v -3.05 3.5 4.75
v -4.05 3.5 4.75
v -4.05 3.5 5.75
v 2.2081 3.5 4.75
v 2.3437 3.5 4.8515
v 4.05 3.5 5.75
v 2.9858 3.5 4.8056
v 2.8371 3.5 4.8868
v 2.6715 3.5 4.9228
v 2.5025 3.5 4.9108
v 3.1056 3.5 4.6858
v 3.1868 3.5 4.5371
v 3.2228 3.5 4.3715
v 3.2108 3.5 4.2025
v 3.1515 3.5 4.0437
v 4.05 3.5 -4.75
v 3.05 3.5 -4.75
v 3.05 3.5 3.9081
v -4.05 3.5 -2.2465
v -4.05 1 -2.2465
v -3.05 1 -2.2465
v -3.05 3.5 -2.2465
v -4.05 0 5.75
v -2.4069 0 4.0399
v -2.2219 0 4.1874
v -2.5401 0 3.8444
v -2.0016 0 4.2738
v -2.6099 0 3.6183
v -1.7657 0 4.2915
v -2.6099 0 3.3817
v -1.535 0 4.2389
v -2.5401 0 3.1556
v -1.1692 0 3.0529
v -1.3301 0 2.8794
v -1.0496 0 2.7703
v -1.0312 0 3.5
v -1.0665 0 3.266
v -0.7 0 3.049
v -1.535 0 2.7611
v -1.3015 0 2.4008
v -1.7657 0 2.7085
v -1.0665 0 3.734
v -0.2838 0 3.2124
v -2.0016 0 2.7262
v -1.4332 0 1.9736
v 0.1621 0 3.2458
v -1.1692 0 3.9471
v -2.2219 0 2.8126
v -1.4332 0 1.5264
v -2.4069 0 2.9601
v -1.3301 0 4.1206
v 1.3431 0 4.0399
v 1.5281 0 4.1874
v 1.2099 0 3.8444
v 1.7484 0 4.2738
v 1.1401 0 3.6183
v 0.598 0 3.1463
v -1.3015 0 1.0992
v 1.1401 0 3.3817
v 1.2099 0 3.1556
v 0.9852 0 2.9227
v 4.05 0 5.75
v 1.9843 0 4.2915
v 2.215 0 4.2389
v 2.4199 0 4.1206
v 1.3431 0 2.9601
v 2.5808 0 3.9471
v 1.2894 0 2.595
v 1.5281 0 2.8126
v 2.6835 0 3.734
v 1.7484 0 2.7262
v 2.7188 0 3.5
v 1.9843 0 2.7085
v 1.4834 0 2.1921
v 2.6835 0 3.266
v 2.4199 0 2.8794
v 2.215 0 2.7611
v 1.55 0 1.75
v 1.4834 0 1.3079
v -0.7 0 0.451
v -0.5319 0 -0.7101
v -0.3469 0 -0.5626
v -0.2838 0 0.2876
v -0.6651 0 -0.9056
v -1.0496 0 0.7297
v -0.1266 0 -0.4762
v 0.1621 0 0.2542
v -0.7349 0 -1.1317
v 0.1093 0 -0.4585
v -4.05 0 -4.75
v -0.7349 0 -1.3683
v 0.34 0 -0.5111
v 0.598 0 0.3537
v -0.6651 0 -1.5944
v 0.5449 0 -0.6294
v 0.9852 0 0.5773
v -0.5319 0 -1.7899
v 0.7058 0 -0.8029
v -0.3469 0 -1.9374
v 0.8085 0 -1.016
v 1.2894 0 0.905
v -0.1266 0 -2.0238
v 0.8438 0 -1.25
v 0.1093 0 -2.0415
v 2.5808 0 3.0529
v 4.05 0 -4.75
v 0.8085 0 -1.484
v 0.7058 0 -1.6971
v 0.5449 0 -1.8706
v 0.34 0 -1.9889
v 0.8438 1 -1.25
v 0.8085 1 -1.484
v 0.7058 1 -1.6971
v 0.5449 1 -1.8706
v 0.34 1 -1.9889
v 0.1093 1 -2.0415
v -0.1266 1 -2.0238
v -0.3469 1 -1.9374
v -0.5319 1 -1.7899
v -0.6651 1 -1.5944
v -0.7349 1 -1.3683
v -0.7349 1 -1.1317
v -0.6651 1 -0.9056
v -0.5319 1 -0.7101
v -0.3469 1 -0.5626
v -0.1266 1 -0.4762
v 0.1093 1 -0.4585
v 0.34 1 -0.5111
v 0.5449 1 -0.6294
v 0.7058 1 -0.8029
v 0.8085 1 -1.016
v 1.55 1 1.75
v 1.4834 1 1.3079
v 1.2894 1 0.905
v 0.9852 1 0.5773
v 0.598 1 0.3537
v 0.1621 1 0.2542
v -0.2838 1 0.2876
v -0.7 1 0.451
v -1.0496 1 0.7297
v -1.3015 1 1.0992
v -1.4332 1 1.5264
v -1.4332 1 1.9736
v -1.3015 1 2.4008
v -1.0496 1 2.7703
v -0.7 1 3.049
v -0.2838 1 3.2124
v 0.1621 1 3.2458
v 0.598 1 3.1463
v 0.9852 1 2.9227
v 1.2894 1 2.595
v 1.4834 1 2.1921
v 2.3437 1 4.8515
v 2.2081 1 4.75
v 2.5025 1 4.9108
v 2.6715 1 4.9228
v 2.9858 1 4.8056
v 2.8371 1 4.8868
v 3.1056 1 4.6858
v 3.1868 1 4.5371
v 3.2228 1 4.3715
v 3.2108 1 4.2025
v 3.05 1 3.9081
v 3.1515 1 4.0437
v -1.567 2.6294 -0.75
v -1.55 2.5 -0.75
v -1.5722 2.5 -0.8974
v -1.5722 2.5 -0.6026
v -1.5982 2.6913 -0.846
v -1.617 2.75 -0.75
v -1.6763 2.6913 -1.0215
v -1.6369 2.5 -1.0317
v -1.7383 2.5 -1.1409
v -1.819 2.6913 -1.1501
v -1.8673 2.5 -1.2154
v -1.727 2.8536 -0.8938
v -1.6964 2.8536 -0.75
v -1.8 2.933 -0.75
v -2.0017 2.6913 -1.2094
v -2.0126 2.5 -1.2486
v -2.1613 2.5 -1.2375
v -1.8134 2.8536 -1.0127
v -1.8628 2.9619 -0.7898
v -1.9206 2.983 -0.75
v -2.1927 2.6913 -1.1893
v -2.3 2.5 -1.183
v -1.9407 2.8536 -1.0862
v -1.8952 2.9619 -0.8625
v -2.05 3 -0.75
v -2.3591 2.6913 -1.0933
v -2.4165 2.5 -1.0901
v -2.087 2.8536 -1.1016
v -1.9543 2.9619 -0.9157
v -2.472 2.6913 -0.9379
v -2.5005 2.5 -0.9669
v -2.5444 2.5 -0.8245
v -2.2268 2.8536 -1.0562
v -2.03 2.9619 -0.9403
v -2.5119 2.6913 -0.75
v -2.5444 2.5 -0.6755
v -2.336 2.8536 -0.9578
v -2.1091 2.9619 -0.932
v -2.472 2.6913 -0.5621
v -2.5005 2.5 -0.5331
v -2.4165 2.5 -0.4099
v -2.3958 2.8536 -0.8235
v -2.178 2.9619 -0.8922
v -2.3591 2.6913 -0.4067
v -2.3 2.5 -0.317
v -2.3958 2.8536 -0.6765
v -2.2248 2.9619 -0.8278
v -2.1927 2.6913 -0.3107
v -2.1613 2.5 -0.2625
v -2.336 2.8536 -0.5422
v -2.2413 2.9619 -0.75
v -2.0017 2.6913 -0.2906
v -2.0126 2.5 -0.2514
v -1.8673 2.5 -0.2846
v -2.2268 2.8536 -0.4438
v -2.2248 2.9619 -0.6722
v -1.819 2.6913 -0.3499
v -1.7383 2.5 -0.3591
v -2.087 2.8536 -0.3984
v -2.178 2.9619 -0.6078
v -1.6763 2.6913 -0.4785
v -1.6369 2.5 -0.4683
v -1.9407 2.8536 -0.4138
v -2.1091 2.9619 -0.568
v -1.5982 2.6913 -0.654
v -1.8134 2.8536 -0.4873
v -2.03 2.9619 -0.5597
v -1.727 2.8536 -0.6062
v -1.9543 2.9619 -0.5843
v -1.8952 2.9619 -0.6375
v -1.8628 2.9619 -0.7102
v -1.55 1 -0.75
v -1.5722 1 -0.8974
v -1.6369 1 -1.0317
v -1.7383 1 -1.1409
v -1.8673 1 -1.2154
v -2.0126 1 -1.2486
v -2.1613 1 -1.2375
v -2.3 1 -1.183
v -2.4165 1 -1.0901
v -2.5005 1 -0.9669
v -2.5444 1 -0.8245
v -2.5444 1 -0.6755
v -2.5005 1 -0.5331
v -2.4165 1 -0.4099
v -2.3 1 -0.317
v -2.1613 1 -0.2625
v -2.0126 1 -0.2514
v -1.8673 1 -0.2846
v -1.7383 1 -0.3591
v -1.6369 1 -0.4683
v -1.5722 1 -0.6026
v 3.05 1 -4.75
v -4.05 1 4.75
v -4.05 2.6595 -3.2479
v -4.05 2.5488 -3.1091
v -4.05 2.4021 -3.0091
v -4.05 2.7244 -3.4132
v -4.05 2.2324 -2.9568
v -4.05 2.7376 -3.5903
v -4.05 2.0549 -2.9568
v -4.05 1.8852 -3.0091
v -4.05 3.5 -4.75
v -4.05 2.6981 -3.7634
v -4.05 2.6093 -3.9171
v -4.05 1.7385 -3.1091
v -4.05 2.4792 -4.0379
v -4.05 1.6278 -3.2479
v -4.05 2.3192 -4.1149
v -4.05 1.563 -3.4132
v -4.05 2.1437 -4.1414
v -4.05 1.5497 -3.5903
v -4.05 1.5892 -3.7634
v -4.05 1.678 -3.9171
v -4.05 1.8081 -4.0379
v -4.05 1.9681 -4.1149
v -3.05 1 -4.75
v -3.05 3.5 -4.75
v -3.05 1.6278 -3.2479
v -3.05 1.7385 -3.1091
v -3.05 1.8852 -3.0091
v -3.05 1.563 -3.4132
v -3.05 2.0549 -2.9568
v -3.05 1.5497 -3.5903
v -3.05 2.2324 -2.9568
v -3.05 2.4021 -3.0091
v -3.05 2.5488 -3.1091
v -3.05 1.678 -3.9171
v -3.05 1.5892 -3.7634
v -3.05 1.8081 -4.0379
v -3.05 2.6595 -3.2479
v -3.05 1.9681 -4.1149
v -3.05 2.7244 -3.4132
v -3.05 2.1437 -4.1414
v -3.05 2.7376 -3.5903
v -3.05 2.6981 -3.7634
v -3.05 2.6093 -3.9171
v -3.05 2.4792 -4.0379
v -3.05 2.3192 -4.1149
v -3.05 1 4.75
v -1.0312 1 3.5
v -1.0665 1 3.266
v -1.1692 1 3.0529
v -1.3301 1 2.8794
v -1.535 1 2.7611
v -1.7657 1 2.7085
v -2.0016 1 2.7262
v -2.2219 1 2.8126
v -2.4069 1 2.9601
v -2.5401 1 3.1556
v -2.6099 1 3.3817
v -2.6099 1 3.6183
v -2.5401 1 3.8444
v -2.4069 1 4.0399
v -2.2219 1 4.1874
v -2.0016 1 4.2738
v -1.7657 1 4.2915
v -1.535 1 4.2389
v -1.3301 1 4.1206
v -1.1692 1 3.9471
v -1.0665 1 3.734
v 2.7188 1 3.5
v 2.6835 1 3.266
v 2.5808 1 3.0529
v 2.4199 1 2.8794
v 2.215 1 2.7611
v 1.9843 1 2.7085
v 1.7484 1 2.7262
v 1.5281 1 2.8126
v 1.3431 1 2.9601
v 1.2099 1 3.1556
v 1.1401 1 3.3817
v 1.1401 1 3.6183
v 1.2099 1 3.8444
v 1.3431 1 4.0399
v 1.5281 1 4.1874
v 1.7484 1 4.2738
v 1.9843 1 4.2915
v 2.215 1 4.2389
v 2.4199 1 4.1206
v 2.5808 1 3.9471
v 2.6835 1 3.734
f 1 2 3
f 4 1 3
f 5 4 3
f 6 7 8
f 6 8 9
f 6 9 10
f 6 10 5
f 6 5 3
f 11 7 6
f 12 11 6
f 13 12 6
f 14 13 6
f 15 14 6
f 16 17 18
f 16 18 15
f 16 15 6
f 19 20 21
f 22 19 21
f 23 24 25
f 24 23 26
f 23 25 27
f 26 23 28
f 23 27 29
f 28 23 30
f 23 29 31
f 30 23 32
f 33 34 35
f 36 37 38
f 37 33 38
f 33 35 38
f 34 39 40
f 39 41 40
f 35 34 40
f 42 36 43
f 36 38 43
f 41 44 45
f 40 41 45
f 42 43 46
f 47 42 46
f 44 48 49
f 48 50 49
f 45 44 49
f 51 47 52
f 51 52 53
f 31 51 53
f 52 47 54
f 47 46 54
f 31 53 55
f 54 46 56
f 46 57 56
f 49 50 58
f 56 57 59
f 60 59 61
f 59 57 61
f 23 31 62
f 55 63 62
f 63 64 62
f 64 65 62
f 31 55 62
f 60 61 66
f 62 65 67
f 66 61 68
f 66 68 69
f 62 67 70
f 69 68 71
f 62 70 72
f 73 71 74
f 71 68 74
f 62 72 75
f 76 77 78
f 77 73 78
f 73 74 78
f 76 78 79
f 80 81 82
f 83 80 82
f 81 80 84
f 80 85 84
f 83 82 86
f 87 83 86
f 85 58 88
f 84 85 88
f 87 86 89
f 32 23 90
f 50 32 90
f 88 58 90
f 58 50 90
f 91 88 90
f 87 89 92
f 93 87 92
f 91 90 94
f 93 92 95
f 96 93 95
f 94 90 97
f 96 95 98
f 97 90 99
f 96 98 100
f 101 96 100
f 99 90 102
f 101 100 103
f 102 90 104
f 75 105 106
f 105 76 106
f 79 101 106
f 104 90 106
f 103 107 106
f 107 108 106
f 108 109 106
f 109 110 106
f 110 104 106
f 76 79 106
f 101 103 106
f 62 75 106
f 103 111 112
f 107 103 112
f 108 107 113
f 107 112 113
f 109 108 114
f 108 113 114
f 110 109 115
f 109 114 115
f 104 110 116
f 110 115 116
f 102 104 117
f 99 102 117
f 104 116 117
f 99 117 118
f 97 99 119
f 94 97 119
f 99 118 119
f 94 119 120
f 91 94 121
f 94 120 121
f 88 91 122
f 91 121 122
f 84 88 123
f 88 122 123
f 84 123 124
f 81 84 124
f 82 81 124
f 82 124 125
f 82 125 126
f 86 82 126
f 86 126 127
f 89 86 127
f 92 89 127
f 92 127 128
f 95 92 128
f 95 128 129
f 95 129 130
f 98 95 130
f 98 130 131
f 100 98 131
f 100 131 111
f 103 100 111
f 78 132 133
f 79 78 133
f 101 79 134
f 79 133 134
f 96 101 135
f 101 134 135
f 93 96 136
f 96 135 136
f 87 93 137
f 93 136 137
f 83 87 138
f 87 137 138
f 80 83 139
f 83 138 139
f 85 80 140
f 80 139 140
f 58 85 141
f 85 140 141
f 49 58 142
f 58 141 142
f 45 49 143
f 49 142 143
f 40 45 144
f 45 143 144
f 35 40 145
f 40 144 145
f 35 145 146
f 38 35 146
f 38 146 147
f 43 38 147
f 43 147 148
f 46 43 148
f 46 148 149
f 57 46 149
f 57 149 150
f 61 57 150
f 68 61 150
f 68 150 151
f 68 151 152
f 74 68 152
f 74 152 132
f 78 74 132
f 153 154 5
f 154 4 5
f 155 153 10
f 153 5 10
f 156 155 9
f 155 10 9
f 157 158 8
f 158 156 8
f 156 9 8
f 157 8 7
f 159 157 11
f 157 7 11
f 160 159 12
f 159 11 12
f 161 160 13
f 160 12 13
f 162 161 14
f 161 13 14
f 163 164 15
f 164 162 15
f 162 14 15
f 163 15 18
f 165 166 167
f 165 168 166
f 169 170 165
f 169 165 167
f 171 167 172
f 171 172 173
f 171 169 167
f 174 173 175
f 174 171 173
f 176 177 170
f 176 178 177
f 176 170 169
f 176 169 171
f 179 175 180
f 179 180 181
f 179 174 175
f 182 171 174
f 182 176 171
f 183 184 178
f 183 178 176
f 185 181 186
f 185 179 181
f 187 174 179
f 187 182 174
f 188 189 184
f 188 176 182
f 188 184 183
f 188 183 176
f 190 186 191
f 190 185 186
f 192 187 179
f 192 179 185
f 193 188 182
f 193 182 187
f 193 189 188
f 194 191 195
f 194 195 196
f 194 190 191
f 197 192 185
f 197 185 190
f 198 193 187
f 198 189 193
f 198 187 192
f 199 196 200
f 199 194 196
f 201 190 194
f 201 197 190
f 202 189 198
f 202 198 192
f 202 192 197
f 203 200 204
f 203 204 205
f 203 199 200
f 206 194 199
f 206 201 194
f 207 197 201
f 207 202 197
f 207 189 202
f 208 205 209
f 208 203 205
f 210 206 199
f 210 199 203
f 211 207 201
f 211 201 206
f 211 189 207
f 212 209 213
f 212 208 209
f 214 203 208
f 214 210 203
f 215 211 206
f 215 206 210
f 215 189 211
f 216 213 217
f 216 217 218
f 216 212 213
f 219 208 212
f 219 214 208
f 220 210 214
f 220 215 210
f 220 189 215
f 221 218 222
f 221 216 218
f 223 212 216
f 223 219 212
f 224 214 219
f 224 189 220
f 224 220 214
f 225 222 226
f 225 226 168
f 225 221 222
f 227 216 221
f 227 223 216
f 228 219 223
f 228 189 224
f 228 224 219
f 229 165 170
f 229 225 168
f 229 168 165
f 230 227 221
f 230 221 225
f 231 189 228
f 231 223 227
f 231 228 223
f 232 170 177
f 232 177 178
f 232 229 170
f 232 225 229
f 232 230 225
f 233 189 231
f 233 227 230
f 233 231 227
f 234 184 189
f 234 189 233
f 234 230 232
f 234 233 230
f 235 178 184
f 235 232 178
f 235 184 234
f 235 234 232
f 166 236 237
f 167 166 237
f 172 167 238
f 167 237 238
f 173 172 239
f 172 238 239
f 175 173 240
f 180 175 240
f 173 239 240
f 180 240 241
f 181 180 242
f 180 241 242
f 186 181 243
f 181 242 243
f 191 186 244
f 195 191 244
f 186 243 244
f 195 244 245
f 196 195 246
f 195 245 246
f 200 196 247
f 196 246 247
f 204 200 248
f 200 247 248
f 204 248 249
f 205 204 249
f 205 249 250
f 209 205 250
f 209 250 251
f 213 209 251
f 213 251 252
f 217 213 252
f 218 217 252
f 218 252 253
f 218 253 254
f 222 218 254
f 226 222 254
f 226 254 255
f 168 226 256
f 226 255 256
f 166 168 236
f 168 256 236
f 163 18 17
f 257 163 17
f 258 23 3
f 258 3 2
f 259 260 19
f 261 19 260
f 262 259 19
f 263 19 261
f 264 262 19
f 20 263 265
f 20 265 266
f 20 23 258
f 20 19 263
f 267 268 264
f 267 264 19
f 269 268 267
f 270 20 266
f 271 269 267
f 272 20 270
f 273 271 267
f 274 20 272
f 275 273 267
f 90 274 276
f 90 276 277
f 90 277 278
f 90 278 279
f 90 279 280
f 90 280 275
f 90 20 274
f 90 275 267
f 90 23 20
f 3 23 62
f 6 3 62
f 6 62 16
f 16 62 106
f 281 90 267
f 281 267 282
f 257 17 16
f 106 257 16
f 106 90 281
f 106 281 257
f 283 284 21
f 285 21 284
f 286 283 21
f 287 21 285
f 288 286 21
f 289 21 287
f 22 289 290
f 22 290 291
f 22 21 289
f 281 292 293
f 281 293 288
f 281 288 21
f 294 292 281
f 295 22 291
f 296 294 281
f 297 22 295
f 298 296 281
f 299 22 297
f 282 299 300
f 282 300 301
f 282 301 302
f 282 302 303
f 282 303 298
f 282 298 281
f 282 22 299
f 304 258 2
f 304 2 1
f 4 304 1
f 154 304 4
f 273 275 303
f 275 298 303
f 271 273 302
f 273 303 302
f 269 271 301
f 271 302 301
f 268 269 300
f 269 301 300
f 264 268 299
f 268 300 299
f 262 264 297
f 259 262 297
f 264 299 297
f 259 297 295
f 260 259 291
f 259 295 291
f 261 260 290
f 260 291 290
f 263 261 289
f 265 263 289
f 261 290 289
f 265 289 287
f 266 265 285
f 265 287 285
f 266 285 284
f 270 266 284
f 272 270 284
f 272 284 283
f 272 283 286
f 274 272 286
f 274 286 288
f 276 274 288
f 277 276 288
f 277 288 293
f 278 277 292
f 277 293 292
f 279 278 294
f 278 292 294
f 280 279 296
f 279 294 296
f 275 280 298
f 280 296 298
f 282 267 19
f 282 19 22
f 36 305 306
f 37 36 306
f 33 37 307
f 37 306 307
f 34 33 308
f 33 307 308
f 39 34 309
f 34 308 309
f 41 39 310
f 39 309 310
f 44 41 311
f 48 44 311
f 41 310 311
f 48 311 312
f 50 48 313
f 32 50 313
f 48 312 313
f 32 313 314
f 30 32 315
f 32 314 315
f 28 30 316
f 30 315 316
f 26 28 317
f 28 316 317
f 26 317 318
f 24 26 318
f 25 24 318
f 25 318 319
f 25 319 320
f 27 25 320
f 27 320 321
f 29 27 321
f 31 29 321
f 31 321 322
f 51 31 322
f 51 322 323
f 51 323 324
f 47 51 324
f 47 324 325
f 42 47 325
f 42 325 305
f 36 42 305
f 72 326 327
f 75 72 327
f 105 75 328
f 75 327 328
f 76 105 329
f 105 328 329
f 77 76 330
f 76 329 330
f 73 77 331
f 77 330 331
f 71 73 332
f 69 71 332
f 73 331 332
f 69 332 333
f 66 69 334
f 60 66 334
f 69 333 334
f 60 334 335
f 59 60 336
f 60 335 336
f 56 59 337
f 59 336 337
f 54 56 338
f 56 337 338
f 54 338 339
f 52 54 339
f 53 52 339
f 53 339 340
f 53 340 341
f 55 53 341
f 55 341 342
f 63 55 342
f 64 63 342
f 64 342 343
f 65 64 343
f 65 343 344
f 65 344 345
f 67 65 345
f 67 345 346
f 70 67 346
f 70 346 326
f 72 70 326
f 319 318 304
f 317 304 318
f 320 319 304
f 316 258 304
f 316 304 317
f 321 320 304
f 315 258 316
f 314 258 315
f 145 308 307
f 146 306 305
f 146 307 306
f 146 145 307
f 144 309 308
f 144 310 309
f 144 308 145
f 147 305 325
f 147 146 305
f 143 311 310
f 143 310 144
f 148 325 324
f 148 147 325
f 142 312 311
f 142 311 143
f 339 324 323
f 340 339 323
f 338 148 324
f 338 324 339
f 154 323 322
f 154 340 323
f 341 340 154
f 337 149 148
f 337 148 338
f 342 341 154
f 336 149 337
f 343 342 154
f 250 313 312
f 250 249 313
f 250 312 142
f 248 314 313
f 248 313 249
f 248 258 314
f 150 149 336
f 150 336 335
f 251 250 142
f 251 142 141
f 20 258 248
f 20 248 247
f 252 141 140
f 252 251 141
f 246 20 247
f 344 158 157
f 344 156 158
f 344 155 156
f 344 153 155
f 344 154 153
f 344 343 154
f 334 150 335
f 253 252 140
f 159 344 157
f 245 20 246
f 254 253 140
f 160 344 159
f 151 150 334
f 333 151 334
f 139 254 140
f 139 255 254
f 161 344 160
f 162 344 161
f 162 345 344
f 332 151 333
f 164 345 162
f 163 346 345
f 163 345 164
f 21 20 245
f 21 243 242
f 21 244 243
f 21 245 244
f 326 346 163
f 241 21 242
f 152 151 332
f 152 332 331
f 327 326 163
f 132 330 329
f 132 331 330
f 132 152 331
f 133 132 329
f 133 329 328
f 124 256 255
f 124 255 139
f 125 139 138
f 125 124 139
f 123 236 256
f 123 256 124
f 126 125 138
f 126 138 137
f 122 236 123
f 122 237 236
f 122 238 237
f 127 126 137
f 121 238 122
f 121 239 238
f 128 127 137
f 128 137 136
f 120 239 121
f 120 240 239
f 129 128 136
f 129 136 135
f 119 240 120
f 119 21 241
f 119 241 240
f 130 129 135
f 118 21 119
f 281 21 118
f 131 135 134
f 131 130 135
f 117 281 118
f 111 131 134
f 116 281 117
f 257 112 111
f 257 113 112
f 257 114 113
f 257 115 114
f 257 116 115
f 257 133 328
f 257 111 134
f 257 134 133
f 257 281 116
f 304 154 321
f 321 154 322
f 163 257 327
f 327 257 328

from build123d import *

# Parameters (mm, degrees)
SKETCH1_W                          = 8.1
SKETCH1_H                          = 11.5
BOSS_EXTRUDE1_DEPTH                = 3.5
SKETCH2_W                          = 6.1
SKETCH2_H                          = 9.5
CUT_EXTRUDE1_DEPTH                 = 2.5
SKETCH3_R                          = 1.5
CUT_EXTRUDE2_DEPTH                 = 2
SKETCH6_R                          = 0.5953125
CUT_EXTRUDE5_DEPTH                 = 2.5
SKETCH7_R                          = 0.79375
CUT_EXTRUDE6_DEPTH                 = 2
SKETCH16_W                         = 8.991857398
SKETCH16_H                         = 1
BACK_CUT_EXTRUDE_DEPTH             = 4
SKETCH17_W                         = 1
SKETCH17_H                         = 6.996497869
SIDE_CUT_EXTRUDE_DEPTH             = 3
SKETCH18_R                         = 0.5
PEG_EXTRUDE_DEPTH                  = 2
FILLET1_R                          = 0.5
TAP_DRILL_SLOT_FOR_0_80_TAP2_D     = 1.19126
TAP_DRILL_SLOT_FOR_0_80_TAP2_DEPTH = 1
TAP_DRILL_SLOT_FOR_0_80_TAP2_TIP   = 0.357890611


with BuildPart() as part:
    # Sketch1 → Boss-Extrude1 (new body)
    with BuildSketch(Plane(origin=(0, 0, 0), x_dir=(1, 0, 0), z_dir=(0, 1, 0))):
        Rectangle(SKETCH1_W, SKETCH1_H)
    extrude(amount=BOSS_EXTRUDE1_DEPTH)

    # Sketch2 → Cut-Extrude1 (cut)
    with BuildSketch(Plane(origin=(0, 3.5, 0), x_dir=(1, 0, 0), z_dir=(0, 1, 0))):
        Rectangle(SKETCH2_W, SKETCH2_H)
    extrude(amount=-CUT_EXTRUDE1_DEPTH, mode=Mode.SUBTRACT)

    # Sketch3 → Cut-Extrude2 (cut, through all)
    with BuildSketch(Plane(origin=(0, 1, 0), x_dir=(1, 0, 0), z_dir=(0, 1, 0))):
        with Locations((0.05, -1.75)):
            Circle(SKETCH3_R)
    extrude(amount=-CUT_EXTRUDE2_DEPTH, mode=Mode.SUBTRACT)

    # Sketch6 → Cut-Extrude5 (cut)
    with BuildSketch(Plane(origin=(0, 3.5, 0), x_dir=(1, 0, 0), z_dir=(0, 1, 0))):
        with Locations((2.629050494, -4.329050494)):
            Circle(SKETCH6_R)
    extrude(amount=-CUT_EXTRUDE5_DEPTH, mode=Mode.SUBTRACT)

    # Sketch7 → Cut-Extrude6 (cut, through all)
    with BuildSketch(Plane(origin=(0, 1, 0), x_dir=(1, 0, 0), z_dir=(0, 1, 0))):
        with Locations((0.05, 1.25)):
            Circle(SKETCH7_R)
        with Locations((-1.825, -3.5)):
            Circle(SKETCH7_R)
        with Locations((1.925, -3.5)):
            Circle(SKETCH7_R)
    extrude(amount=-CUT_EXTRUDE6_DEPTH, mode=Mode.SUBTRACT)

    # Sketch16 → Back-cut-extrude (cut)
    with BuildSketch(Plane.XZ):
        with Locations((-0.234538983, -5.25)):
            Rectangle(SKETCH16_W, SKETCH16_H)
    extrude(amount=-BACK_CUT_EXTRUDE_DEPTH, mode=Mode.SUBTRACT)

    # Sketch17 → Side-cut-extrude (cut)
    with BuildSketch(Plane(origin=(0, 1, 0), x_dir=(1, 0, 0), z_dir=(0, 1, 0))):
        with Locations((-3.55, -1.251751065)):
            Rectangle(SKETCH17_W, SKETCH17_H)
    extrude(amount=SIDE_CUT_EXTRUDE_DEPTH, mode=Mode.SUBTRACT)

    # Sketch18 → Peg-Extrude (add)
    with BuildSketch(Plane(origin=(0, 1, 0), x_dir=(1, 0, 0), z_dir=(0, 1, 0))):
        with Locations((-2.05, 0.75)):
            Circle(SKETCH18_R)
    extrude(amount=PEG_EXTRUDE_DEPTH)

    # Fillet1
    fillet1_edges = [part.edges().sort_by_distance(p)[0] for p in [
        (-2.55, 3, -0.75),
    ]]
    fillet(fillet1_edges, radius=FILLET1_R)

    # Tap Drill Slot for #0-80 Tap2
    with Locations(Plane.ZY.offset(4.05)):
        with Locations((-3.545754268, 2.143662575)):
            Hole(TAP_DRILL_SLOT_FOR_0_80_TAP2_D / 2, depth=TAP_DRILL_SLOT_FOR_0_80_TAP2_DEPTH)
            with Locations((0, 0, -(TAP_DRILL_SLOT_FOR_0_80_TAP2_DEPTH + TAP_DRILL_SLOT_FOR_0_80_TAP2_TIP / 2))):  # 118° drill point
                Cone(0, TAP_DRILL_SLOT_FOR_0_80_TAP2_D / 2, TAP_DRILL_SLOT_FOR_0_80_TAP2_TIP, mode=Mode.SUBTRACT)


solid = part.part
